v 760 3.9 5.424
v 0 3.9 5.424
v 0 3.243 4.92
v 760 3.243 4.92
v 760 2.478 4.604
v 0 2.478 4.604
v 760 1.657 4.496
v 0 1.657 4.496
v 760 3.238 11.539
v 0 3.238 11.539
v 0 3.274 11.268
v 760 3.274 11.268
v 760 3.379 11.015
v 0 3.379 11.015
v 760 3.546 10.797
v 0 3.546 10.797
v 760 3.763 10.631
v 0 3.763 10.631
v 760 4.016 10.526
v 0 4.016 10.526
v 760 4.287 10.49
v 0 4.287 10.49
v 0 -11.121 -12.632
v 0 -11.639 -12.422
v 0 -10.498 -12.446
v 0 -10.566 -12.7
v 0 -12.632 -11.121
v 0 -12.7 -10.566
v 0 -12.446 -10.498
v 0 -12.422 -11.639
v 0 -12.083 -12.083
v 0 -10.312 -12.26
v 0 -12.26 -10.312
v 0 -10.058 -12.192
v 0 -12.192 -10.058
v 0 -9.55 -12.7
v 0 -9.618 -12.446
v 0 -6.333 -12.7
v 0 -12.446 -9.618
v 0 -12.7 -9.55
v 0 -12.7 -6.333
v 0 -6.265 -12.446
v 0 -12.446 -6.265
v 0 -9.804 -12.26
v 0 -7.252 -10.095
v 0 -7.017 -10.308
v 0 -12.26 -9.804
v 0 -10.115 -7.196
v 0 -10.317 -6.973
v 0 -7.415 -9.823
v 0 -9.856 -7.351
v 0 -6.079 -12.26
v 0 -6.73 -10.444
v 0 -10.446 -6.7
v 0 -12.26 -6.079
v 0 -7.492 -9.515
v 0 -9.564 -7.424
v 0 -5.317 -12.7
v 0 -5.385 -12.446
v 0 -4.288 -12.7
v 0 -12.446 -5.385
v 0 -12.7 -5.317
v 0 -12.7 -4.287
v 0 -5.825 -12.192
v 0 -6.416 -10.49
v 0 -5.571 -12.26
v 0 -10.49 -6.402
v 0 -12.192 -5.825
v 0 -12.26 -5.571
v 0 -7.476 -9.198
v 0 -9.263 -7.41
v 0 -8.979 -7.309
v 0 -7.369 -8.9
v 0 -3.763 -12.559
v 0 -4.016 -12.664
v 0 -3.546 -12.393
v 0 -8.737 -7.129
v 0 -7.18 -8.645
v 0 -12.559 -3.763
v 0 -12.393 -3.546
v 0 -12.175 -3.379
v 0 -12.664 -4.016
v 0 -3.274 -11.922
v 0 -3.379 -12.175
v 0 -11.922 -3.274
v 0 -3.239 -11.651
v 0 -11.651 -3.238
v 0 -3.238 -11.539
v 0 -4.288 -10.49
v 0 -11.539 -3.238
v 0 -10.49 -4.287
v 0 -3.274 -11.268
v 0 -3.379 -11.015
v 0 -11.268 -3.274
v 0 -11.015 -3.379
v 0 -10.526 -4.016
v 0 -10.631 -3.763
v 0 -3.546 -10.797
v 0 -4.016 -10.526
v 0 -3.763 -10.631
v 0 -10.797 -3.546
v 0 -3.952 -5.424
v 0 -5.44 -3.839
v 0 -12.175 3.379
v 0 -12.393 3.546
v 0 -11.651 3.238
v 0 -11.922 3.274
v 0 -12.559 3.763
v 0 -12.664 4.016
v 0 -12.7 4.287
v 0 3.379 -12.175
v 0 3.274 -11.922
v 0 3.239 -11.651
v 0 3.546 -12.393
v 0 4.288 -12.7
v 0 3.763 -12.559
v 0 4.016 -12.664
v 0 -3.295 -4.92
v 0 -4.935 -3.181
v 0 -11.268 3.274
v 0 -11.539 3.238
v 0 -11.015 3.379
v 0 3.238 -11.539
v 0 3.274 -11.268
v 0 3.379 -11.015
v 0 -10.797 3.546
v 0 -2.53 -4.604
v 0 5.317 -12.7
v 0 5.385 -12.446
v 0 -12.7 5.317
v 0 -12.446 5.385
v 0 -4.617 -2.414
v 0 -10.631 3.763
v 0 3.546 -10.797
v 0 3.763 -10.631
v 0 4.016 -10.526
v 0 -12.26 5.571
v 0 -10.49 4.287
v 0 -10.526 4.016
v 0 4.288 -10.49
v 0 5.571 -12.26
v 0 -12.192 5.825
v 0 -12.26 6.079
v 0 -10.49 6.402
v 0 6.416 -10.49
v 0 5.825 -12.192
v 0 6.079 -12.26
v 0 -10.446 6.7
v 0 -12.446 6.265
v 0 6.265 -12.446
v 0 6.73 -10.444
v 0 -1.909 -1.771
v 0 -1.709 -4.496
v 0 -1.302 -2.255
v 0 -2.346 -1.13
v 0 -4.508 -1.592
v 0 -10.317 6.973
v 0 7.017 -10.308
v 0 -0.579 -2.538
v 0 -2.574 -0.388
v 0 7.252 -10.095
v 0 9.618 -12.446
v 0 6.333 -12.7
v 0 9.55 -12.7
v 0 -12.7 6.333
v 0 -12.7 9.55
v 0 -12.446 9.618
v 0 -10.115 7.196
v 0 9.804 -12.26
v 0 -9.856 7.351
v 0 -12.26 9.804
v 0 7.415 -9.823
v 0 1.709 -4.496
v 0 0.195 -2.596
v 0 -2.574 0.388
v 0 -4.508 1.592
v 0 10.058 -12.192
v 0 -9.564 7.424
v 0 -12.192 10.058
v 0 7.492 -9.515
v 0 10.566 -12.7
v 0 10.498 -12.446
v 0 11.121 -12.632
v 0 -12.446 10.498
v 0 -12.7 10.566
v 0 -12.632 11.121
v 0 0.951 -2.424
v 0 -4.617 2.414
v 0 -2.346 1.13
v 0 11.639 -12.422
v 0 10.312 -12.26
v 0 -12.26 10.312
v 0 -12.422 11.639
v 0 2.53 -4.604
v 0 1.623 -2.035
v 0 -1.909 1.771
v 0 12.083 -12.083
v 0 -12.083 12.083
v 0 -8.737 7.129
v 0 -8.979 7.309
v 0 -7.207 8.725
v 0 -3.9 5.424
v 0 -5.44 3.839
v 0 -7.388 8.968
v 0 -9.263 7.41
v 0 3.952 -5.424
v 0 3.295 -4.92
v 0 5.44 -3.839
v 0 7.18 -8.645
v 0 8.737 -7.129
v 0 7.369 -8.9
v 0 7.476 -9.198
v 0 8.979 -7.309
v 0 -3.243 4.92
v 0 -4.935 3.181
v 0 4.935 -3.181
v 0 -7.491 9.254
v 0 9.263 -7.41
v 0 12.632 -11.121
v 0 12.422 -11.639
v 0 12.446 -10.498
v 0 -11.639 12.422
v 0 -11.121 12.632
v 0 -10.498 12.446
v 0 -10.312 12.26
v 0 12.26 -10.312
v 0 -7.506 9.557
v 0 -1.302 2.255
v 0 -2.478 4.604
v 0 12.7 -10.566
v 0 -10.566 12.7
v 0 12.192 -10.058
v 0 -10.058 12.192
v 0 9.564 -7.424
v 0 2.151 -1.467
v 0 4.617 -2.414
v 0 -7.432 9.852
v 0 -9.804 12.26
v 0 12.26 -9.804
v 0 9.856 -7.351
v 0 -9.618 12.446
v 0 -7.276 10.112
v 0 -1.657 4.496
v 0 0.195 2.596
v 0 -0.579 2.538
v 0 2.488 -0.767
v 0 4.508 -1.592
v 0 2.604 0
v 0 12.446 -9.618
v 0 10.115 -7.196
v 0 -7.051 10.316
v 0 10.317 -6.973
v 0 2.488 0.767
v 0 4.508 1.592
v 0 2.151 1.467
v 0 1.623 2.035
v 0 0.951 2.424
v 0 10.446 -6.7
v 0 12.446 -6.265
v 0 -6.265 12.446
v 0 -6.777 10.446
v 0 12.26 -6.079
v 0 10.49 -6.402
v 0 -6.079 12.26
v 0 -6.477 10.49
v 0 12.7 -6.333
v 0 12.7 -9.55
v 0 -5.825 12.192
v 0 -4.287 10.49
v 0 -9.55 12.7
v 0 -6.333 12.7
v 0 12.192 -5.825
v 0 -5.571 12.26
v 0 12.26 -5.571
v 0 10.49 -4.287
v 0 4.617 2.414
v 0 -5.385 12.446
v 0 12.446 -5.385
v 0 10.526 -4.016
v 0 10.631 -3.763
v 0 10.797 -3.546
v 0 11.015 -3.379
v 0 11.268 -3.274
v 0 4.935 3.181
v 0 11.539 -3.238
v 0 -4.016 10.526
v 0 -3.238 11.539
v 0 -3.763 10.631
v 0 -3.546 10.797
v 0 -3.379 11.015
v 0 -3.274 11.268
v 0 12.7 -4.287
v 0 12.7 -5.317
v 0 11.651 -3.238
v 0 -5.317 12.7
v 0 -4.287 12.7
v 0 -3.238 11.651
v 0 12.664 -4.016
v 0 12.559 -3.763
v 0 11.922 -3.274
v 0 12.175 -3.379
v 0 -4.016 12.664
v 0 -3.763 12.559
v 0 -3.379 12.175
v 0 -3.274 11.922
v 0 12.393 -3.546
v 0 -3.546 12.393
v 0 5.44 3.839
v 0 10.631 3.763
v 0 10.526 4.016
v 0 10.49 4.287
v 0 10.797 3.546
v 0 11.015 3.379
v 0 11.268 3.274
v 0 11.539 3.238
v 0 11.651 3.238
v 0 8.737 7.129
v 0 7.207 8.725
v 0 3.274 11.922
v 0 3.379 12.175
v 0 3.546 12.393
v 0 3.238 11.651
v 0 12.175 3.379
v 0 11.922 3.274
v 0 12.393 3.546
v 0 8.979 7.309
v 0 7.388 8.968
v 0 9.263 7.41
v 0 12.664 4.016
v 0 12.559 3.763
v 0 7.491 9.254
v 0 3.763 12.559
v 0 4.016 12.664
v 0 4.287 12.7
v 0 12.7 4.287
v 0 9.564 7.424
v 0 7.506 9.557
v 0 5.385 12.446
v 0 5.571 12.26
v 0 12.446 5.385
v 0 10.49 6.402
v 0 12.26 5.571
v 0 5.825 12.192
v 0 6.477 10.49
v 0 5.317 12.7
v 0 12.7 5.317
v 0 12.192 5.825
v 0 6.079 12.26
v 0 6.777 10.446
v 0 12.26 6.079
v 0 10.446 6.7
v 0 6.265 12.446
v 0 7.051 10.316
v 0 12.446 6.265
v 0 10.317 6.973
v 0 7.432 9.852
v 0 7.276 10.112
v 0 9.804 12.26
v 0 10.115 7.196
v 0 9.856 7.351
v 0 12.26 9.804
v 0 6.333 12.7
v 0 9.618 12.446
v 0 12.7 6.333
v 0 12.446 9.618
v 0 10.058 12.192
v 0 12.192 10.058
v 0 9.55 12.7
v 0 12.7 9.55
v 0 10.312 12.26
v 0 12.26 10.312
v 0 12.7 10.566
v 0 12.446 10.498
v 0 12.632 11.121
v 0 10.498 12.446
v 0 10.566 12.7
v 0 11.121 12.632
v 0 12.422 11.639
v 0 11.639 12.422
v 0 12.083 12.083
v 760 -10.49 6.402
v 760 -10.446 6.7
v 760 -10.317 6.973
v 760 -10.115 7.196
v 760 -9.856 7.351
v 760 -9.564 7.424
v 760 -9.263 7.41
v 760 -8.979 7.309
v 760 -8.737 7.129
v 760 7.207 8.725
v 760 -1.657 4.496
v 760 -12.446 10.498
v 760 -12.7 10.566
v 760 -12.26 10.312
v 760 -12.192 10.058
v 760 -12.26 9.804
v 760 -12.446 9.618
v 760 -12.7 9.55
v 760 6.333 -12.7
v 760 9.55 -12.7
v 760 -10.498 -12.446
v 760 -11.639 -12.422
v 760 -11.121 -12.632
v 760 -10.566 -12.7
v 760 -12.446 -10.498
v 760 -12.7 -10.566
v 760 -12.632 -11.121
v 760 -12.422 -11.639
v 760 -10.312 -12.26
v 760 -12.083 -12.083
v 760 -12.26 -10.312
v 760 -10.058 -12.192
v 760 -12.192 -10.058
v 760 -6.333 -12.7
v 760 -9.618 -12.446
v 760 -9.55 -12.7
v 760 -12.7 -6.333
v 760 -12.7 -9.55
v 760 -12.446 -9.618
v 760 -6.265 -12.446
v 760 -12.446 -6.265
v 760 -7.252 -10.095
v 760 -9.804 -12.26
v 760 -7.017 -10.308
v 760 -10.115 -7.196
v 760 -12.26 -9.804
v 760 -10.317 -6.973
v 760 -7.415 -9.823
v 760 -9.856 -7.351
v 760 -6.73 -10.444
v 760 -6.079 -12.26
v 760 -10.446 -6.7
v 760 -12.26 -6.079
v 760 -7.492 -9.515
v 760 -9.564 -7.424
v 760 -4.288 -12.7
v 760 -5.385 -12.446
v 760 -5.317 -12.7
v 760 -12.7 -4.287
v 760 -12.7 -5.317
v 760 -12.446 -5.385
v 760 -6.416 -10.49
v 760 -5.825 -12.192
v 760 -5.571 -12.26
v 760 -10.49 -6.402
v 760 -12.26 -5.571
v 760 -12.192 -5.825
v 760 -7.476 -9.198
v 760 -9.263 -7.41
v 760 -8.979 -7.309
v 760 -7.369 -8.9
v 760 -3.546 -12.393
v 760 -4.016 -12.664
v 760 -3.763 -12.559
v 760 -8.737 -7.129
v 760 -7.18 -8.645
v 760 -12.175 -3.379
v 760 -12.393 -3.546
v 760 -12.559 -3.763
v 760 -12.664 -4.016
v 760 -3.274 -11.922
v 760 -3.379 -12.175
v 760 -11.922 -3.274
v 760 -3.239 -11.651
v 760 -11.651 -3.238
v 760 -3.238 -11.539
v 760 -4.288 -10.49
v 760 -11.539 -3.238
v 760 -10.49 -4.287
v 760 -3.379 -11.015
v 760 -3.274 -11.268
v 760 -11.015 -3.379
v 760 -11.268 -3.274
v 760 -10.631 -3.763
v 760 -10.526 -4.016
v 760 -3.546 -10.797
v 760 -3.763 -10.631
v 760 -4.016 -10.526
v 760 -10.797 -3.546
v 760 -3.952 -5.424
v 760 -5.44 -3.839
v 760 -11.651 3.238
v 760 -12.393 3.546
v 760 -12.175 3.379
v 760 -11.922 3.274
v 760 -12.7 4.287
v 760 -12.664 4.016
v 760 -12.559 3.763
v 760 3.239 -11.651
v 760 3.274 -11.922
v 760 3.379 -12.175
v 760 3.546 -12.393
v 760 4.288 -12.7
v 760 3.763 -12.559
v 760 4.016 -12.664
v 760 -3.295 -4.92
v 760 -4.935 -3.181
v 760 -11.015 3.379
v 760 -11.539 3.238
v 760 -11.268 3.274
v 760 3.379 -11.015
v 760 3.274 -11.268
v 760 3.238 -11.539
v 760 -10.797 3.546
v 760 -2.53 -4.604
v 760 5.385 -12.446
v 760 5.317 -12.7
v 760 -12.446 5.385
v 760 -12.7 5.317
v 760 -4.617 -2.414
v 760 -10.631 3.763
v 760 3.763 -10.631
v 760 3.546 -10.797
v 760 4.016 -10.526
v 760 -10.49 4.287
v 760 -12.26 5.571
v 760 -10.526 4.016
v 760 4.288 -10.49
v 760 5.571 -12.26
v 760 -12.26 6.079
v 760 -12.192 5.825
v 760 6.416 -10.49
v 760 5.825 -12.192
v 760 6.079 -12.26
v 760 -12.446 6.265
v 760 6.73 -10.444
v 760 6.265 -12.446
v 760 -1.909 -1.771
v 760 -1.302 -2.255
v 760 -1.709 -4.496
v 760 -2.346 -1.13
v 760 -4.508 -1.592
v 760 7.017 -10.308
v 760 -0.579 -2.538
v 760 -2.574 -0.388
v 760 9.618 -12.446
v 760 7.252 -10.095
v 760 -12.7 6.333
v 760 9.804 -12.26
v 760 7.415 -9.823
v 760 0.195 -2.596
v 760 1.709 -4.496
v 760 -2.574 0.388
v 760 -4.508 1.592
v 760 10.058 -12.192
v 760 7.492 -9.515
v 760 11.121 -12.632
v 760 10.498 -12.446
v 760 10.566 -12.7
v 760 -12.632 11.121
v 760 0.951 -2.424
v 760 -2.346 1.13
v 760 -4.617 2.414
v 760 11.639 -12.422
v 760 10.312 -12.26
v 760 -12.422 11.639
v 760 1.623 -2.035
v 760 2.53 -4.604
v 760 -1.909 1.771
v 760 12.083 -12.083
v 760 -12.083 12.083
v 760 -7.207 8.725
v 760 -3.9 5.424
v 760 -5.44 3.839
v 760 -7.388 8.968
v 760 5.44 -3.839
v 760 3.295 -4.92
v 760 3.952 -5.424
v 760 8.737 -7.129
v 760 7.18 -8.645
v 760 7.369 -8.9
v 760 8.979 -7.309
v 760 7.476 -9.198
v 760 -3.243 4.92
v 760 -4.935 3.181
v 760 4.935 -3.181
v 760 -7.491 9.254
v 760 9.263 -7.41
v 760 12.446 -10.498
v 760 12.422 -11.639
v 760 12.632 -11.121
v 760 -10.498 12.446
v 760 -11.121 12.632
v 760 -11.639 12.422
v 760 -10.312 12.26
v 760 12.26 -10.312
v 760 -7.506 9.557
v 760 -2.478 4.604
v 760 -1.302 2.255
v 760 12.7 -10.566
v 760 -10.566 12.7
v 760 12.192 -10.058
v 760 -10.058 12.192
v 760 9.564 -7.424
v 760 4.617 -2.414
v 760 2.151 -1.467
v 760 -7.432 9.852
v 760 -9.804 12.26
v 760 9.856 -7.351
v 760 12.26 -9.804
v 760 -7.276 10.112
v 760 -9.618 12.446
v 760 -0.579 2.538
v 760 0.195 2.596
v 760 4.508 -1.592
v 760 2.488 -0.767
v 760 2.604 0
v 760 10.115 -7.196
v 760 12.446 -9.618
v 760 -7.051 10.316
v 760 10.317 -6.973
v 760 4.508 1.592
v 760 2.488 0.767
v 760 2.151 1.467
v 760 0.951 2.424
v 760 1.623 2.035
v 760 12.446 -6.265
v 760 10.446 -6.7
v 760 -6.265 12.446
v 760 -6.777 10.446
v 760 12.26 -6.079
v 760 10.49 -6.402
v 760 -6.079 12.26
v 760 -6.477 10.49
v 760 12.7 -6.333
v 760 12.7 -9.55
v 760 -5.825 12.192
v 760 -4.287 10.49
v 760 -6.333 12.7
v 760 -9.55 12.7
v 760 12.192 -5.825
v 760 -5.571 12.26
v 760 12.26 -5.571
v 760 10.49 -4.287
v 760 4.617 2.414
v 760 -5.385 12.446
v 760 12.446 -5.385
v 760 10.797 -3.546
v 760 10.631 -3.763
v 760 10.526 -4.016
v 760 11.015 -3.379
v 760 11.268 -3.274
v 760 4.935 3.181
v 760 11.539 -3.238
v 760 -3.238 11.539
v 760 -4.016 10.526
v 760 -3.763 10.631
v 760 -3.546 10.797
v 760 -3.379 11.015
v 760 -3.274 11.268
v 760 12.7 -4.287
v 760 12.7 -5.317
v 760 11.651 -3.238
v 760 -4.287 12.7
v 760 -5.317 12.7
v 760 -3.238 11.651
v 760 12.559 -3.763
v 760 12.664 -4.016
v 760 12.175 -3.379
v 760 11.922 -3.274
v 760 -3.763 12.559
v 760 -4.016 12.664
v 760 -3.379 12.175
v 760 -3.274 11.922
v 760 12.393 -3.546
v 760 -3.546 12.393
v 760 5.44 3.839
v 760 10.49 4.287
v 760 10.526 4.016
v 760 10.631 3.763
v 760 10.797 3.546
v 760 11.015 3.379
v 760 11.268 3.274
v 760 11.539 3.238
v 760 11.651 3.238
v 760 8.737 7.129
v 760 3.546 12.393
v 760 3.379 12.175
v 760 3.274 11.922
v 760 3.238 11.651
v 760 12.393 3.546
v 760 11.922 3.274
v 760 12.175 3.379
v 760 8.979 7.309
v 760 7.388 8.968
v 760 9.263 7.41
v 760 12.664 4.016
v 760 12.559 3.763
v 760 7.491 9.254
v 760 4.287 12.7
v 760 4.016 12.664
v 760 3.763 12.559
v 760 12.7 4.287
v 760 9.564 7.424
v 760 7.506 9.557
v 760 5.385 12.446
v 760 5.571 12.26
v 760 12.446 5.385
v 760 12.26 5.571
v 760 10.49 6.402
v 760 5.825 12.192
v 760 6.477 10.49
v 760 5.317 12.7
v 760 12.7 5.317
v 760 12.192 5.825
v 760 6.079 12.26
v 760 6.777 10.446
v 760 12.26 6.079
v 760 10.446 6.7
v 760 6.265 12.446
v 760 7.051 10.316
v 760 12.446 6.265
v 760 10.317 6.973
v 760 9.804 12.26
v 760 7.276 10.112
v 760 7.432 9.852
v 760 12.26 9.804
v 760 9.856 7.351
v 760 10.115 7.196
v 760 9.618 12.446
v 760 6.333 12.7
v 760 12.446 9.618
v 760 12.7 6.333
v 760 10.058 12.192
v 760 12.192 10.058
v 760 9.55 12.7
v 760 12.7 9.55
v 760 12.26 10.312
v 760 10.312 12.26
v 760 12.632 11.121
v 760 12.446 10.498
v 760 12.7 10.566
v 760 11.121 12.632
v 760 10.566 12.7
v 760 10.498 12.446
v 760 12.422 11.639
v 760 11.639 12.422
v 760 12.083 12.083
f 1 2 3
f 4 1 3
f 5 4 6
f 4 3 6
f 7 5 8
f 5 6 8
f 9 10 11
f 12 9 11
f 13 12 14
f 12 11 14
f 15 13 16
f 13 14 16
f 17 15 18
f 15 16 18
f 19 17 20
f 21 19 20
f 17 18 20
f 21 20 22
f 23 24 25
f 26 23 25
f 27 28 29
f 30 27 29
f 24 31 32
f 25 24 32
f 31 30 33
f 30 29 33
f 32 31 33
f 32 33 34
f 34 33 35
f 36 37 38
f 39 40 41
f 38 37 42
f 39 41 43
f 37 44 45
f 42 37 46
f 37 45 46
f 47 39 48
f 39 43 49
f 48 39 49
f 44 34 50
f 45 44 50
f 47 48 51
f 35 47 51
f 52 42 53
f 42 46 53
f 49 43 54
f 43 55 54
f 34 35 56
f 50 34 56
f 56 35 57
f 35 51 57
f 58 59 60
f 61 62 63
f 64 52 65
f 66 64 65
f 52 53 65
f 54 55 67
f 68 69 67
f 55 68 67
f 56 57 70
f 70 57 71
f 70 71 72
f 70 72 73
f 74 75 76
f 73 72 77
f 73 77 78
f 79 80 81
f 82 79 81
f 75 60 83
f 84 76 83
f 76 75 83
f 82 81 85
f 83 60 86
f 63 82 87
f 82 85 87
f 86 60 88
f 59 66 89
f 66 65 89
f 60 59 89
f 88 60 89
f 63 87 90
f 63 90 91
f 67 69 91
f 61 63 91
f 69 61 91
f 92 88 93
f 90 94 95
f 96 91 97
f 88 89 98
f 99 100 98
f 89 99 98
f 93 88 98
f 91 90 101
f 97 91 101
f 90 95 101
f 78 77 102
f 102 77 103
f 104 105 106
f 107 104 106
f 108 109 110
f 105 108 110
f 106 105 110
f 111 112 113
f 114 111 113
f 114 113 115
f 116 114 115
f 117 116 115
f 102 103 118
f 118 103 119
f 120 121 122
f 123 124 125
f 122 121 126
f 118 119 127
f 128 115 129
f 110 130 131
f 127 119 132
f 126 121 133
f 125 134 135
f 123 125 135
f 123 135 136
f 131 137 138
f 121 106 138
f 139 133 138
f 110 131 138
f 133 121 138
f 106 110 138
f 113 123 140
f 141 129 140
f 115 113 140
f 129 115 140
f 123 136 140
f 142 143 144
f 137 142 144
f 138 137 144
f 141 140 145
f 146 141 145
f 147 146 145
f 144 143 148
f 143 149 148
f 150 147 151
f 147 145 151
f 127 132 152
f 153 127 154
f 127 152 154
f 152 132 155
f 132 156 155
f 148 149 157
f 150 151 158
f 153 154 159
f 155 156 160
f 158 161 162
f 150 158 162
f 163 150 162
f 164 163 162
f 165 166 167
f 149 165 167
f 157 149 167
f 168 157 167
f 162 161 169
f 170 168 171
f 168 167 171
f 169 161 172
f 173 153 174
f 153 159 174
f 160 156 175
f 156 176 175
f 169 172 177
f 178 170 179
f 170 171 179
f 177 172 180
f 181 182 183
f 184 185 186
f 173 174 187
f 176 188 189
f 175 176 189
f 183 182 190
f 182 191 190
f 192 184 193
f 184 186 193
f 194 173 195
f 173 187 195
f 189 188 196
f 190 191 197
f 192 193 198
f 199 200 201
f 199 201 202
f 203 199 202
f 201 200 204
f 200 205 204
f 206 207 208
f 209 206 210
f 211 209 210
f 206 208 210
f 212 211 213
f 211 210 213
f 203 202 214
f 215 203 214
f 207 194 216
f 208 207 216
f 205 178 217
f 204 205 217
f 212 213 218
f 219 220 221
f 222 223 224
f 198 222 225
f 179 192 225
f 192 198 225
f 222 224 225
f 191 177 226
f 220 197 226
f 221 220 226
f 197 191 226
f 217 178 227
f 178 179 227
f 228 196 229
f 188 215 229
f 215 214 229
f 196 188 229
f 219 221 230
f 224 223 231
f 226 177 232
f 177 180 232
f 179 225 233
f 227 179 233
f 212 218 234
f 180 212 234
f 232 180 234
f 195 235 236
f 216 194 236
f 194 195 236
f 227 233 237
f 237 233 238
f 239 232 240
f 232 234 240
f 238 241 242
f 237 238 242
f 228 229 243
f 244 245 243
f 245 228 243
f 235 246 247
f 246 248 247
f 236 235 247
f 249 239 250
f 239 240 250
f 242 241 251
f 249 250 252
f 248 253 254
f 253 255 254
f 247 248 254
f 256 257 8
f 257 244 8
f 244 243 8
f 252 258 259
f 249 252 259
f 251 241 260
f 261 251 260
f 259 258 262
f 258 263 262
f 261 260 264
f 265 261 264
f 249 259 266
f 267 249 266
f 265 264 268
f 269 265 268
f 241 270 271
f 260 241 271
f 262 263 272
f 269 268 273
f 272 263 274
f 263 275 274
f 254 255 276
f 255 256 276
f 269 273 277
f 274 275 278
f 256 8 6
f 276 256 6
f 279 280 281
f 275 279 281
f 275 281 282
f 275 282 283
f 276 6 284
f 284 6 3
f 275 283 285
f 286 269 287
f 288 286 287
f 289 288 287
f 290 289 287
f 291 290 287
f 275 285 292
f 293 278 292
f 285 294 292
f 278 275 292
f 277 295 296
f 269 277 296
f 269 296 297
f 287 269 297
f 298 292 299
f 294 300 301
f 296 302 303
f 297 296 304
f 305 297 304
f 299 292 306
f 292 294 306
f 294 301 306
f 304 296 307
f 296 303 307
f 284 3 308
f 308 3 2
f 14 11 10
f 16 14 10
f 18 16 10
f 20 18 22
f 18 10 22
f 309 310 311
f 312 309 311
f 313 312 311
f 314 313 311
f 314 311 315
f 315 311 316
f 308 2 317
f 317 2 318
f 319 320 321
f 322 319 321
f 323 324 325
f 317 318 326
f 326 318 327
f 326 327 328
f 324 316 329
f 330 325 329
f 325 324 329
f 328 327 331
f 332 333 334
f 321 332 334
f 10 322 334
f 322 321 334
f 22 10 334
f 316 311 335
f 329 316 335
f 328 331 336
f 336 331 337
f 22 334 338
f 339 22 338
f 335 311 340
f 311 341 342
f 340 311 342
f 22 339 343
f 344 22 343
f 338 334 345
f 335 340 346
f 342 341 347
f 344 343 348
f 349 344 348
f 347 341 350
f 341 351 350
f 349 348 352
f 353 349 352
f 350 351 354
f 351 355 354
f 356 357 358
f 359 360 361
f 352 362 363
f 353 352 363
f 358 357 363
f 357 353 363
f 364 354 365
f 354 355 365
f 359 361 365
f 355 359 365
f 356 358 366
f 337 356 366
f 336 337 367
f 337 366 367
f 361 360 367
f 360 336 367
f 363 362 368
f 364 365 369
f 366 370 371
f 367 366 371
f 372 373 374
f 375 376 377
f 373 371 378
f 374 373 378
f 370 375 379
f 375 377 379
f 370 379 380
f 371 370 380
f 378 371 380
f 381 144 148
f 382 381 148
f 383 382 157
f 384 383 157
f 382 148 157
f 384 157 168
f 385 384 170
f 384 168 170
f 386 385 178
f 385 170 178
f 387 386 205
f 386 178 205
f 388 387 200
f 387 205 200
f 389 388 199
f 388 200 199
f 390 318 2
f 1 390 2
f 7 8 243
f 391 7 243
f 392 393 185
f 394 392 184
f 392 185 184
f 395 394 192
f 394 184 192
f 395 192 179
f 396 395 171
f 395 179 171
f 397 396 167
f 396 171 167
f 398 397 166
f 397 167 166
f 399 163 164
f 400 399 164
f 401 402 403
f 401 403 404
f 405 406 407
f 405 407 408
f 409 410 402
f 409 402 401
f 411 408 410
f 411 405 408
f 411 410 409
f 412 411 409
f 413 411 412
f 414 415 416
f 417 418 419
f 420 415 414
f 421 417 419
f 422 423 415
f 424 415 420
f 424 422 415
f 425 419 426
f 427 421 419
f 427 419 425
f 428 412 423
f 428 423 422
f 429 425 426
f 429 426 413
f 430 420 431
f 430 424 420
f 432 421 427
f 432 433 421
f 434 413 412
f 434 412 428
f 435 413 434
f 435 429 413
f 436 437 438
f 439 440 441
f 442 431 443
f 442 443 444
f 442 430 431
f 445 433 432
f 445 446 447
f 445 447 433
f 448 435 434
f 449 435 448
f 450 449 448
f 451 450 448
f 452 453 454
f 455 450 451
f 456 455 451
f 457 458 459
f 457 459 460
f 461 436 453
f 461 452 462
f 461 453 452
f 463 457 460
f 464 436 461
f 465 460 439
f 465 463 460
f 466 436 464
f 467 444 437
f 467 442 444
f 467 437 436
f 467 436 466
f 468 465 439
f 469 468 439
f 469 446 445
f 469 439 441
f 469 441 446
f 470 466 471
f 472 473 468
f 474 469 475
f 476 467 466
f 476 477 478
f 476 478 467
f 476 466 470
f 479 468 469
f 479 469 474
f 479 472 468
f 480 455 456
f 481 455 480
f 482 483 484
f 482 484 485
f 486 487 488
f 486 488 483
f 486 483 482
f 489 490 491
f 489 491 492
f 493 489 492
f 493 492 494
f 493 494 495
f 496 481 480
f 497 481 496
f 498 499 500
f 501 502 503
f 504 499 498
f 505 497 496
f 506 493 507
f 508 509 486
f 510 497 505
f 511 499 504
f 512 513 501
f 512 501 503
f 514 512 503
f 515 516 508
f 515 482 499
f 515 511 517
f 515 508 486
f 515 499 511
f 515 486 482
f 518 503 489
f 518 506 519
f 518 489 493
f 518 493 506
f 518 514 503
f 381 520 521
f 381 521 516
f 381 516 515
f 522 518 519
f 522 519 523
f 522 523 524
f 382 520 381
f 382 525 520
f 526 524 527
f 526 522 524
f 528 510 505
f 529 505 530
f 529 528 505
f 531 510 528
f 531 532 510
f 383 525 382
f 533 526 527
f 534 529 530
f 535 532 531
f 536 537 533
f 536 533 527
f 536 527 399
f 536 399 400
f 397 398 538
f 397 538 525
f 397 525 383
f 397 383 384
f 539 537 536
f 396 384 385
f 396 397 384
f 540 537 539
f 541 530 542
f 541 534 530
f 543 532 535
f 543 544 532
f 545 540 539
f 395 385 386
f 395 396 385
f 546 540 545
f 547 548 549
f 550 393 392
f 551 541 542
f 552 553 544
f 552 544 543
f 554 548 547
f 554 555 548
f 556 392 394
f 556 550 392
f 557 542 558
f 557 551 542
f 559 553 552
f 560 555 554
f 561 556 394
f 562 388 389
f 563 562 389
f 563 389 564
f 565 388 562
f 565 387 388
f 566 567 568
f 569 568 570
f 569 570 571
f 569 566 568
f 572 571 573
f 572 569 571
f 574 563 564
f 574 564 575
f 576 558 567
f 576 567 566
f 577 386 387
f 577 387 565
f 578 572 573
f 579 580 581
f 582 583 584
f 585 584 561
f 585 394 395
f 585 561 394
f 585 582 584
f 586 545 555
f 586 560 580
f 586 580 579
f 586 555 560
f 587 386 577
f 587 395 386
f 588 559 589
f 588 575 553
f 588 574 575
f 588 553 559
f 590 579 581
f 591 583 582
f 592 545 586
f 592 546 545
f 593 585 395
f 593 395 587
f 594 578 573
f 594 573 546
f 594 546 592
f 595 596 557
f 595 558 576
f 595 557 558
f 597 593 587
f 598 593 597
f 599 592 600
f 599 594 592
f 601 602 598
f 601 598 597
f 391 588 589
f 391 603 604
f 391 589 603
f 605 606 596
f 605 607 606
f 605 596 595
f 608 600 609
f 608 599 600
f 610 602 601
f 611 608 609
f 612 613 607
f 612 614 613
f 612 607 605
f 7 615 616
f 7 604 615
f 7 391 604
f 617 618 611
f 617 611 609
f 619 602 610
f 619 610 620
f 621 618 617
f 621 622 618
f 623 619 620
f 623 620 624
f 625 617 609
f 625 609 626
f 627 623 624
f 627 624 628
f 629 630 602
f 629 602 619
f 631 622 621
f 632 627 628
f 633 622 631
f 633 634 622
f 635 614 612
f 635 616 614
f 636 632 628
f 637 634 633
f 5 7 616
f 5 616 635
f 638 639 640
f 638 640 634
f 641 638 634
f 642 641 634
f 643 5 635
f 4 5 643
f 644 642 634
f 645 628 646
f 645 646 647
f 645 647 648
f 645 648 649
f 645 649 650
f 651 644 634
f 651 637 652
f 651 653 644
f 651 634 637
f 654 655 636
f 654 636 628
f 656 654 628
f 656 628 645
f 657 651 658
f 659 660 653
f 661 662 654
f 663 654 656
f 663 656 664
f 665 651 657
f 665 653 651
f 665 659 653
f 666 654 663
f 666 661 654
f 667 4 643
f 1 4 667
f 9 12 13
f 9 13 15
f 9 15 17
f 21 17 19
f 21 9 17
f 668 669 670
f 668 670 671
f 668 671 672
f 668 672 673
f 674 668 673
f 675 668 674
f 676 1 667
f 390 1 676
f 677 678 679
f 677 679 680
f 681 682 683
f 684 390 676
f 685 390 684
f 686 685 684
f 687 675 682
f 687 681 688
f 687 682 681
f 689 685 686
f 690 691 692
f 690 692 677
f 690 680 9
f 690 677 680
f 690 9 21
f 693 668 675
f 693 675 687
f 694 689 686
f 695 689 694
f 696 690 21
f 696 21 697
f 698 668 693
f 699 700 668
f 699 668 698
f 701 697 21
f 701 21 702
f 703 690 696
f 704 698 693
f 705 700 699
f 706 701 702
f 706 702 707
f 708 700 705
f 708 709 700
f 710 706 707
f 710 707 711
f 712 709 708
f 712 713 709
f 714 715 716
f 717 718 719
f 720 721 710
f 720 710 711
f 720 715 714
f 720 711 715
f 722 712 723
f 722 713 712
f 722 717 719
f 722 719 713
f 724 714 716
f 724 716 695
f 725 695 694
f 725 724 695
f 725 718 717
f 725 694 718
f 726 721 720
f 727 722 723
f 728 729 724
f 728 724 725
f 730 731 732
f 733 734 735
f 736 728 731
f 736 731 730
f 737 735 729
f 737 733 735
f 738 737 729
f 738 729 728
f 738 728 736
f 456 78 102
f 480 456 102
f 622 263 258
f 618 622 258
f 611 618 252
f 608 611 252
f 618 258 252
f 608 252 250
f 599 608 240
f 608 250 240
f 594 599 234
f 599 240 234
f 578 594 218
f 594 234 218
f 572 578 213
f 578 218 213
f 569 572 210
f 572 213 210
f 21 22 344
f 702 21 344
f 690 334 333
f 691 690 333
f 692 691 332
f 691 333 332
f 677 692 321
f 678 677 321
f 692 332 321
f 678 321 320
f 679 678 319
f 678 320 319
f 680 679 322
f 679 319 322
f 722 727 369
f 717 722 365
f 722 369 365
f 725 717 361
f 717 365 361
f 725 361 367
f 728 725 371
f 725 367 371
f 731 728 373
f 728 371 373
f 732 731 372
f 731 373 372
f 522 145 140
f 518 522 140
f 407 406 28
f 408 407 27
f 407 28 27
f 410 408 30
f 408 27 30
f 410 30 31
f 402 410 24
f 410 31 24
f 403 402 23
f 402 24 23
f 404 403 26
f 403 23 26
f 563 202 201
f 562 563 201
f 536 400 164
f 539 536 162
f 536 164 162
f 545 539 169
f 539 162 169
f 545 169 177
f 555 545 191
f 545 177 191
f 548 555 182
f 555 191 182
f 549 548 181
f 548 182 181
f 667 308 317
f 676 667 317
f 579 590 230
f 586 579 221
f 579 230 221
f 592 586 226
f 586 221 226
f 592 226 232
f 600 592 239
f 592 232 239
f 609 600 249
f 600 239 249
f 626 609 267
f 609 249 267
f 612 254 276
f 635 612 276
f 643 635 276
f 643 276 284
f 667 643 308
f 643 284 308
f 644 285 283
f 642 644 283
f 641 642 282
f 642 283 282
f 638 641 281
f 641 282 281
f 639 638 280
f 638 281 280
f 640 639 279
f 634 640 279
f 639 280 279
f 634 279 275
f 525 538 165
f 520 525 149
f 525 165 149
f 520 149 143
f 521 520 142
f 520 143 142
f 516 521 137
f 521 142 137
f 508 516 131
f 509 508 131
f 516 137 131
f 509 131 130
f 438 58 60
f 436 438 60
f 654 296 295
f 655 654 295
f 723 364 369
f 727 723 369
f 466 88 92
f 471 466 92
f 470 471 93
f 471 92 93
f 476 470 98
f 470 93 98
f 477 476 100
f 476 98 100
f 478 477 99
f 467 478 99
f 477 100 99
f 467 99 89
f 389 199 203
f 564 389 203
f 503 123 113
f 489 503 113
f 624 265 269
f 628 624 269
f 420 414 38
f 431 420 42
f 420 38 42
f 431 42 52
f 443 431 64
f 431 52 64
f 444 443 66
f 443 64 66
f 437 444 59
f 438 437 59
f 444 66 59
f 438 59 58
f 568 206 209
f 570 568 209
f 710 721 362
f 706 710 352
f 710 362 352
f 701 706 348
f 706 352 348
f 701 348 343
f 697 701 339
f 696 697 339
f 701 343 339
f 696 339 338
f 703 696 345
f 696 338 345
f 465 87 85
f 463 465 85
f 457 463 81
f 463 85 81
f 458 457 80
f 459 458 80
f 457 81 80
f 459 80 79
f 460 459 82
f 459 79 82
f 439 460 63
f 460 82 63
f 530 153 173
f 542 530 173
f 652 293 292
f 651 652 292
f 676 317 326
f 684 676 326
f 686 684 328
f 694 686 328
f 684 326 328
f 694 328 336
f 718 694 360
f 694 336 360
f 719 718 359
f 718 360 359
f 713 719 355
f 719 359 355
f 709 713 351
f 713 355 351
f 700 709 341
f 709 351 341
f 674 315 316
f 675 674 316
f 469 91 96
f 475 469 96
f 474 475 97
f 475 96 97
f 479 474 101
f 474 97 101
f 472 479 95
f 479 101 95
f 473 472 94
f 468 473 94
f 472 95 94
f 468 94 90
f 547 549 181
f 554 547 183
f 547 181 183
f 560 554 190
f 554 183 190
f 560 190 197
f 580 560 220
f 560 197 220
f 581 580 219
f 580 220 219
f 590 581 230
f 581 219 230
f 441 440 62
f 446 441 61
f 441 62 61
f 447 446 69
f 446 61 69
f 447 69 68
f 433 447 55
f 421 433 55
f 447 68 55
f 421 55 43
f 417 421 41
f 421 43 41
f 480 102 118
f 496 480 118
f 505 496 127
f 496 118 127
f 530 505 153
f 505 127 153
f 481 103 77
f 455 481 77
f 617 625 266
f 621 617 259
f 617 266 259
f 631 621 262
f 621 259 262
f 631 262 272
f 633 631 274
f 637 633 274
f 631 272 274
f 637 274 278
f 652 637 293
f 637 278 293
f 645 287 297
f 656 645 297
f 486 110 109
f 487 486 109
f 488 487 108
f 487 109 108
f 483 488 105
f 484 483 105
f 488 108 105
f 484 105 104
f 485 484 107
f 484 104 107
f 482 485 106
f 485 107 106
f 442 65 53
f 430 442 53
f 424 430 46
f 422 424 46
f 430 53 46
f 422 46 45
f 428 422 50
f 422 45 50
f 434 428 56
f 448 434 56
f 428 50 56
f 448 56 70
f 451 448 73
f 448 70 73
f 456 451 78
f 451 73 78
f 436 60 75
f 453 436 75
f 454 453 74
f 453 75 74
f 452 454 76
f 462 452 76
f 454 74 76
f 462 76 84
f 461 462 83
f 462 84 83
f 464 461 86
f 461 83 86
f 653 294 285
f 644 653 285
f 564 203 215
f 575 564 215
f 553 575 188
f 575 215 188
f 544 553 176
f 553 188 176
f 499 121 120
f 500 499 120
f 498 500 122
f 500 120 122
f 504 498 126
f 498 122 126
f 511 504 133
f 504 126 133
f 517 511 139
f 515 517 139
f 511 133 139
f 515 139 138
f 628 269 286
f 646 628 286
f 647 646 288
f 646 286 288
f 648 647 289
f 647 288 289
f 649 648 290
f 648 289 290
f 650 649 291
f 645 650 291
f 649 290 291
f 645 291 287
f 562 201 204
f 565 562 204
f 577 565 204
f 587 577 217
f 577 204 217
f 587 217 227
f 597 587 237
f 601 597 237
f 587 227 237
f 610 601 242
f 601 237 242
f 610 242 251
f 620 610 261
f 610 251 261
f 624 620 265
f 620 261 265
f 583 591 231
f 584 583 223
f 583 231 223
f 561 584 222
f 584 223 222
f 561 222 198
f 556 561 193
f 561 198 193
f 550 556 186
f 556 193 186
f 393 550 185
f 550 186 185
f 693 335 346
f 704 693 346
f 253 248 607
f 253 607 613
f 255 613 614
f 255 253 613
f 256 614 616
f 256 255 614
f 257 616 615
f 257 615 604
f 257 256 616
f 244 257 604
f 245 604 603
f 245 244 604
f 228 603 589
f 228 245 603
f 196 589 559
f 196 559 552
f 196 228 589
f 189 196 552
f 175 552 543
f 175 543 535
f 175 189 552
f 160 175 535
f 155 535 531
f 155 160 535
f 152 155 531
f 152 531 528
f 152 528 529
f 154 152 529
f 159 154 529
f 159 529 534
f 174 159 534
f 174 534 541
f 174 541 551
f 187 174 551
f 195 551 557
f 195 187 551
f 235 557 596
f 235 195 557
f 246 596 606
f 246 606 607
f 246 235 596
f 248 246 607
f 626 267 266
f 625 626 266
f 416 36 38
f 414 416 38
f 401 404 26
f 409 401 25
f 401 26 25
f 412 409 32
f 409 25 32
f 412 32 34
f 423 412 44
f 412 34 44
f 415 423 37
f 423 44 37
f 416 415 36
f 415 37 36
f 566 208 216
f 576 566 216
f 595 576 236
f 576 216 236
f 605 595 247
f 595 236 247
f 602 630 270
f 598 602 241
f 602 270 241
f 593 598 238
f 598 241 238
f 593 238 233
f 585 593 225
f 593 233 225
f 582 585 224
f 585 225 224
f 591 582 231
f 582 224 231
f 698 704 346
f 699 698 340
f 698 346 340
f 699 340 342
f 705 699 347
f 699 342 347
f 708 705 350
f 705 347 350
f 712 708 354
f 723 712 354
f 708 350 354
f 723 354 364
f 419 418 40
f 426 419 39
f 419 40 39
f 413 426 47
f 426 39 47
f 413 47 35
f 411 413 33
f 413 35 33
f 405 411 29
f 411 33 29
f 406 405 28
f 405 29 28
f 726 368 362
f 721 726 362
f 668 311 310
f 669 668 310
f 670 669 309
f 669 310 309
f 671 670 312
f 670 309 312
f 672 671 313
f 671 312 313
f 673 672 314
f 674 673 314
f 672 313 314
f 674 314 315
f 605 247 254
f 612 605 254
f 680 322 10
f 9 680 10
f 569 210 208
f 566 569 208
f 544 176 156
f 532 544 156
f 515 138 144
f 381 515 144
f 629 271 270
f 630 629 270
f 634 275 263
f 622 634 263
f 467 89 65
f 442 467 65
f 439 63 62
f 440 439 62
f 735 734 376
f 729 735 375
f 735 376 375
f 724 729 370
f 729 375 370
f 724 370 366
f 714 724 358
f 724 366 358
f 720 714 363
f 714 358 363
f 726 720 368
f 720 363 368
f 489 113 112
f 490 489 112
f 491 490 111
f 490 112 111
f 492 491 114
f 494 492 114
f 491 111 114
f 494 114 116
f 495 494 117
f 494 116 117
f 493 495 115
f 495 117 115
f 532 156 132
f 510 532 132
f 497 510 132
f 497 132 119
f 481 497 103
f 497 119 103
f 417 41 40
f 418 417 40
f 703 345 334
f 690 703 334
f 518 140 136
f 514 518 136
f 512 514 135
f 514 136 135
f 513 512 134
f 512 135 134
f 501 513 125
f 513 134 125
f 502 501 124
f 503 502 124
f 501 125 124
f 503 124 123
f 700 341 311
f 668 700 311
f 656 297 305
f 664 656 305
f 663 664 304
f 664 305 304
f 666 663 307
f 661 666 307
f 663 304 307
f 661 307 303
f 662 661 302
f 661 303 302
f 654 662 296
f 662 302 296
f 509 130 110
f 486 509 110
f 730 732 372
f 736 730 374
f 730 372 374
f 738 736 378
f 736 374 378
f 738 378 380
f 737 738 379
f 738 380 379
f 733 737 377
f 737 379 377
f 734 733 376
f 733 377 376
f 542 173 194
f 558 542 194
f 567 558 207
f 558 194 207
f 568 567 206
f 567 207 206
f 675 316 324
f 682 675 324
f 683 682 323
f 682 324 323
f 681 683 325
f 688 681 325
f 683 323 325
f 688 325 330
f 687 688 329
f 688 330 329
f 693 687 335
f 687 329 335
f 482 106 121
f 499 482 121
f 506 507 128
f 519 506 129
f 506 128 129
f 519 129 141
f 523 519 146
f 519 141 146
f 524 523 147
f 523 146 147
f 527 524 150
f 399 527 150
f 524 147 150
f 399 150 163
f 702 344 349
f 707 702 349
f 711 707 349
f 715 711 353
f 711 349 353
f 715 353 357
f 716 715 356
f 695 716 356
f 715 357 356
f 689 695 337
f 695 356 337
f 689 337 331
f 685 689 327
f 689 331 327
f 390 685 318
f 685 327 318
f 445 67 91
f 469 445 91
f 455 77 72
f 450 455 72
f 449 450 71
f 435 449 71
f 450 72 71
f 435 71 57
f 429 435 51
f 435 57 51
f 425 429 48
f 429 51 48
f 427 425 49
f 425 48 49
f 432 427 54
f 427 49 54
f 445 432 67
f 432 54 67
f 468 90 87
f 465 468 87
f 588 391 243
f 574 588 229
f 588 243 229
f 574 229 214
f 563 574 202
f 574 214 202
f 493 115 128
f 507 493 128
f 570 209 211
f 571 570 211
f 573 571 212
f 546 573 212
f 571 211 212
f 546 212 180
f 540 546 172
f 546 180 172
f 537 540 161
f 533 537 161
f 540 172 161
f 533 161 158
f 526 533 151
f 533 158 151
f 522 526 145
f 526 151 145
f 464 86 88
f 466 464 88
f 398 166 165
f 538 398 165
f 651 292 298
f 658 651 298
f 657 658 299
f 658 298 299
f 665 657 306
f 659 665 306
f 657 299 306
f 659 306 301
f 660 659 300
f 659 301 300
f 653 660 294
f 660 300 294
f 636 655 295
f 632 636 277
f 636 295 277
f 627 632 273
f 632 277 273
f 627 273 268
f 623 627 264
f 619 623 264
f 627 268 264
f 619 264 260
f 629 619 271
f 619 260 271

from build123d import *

# Parameters (mm, degrees)
SKETCH11_R                     = 2.6035
EXTRUSION_1010_PROFILE_1_DEPTH = 760


with BuildPart() as part:
    # Sketch11 → Extrusion 1010 PROFILE(1) (new body)
    with BuildSketch(Plane.YZ):
        with BuildLine():
            Line((-1.709253557, -4.4958), (1.709253557, -4.4958))
            ThreePointArc((1.709253557, -4.4958), (2.922935876, -4.736928798), (3.95226937, -5.423689619))
            Line((3.95226937, -5.423689619), (7.179652728, -8.645192207))
            ThreePointArc((7.179652728, -8.645192207), (7.414733441, -9.822812921), (6.41641086, -10.4902))
            Line((6.41641086, -10.4902), (4.28752, -10.4902))
            ThreePointArc((4.28752, -10.4902), (3.545750844, -10.797450844), (3.2385, -11.53922))
            Line((3.2385, -11.53922), (3.2385, -11.65098))
            ThreePointArc((3.2385, -11.65098), (3.545750844, -12.392749156), (4.28752, -12.7))
            Line((4.28752, -12.7), (5.3171344, -12.7))
            ThreePointArc((5.3171344, -12.7), (5.8251344, -12.192), (6.3331344, -12.7))
            Line((6.3331344, -12.7), (9.5504, -12.7))
            ThreePointArc((9.5504, -12.7), (10.058323491, -12.192000006), (10.566399977, -12.699846982))
            ThreePointArc((10.566399977, -12.699846982), (12.082522516, -12.082522516), (12.699846982, -10.566399977))
            ThreePointArc((12.699846982, -10.566399977), (12.192000006, -10.058323491), (12.7, -9.5504))
            Line((12.7, -9.5504), (12.7, -6.3330836))
            ThreePointArc((12.7, -6.3330836), (12.192, -5.8250836), (12.7, -5.3170836))
            Line((12.7, -5.3170836), (12.7, -4.287470133))
            ThreePointArc((12.7, -4.287470133), (12.392749156, -3.545700977), (11.65098, -3.238450133))
            Line((11.65098, -3.238450133), (11.53922, -3.238450133))
            ThreePointArc((11.53922, -3.238450133), (10.797450844, -3.545700977), (10.4902, -4.287470133))
            Line((10.4902, -4.287470133), (10.4902, -6.402089023))
            ThreePointArc((10.4902, -6.402089023), (9.856394933, -7.351113629), (8.736962546, -7.129240479))
            Line((8.736962546, -7.129240479), (5.440484187, -3.838768792))
            ThreePointArc((5.440484187, -3.838768792), (4.75073678, -2.808015636), (4.5085, -1.591658411))
            Line((4.5085, -1.591658411), (4.5085, 1.591658411))
            ThreePointArc((4.5085, 1.591658411), (4.75073678, 2.808015636), (5.440484187, 3.838768792))
            Line((5.440484187, 3.838768792), (8.736962546, 7.129240479))
            ThreePointArc((8.736962546, 7.129240479), (9.856394933, 7.351113629), (10.4902, 6.402089023))
            Line((10.4902, 6.402089023), (10.4902, 4.287470133))
            ThreePointArc((10.4902, 4.287470133), (10.797450844, 3.545700977), (11.53922, 3.238450133))
            Line((11.53922, 3.238450133), (11.65098, 3.238450133))
            ThreePointArc((11.65098, 3.238450133), (12.392749156, 3.545700977), (12.7, 4.287470133))
            Line((12.7, 4.287470133), (12.7, 5.3171344))
            ThreePointArc((12.7, 5.3171344), (12.192, 5.8251344), (12.7, 6.3331344))
            Line((12.7, 6.3331344), (12.7, 9.5504))
            ThreePointArc((12.7, 9.5504), (12.192000006, 10.058323491), (12.699846982, 10.566399977))
            ThreePointArc((12.699846982, 10.566399977), (12.082522516, 12.082522516), (10.566399977, 12.699846982))
            ThreePointArc((10.566399977, 12.699846982), (10.058323491, 12.192000006), (9.5504, 12.7))
            Line((9.5504, 12.7), (6.3330836, 12.7))
            ThreePointArc((6.3330836, 12.7), (5.8250836, 12.192), (5.3170836, 12.7))
            Line((5.3170836, 12.7), (4.2874692, 12.7))
            ThreePointArc((4.2874692, 12.7), (3.545700044, 12.392749156), (3.2384492, 11.65098))
            Line((3.2384492, 11.65098), (3.2384492, 11.53922))
            ThreePointArc((3.2384492, 11.53922), (3.545700044, 10.797450844), (4.2874692, 10.4902))
            Line((4.2874692, 10.4902), (6.476774195, 10.4902))
            ThreePointArc((6.476774195, 10.4902), (7.43216212, 9.851515102), (7.207191475, 8.724540082))
            Line((7.207191475, 8.724540082), (3.900315394, 5.423689619))
            ThreePointArc((3.900315394, 5.423689619), (2.8709819, 4.736928798), (1.657299581, 4.4958))
            Line((1.657299581, 4.4958), (-1.657299581, 4.4958))
            ThreePointArc((-1.657299581, 4.4958), (-2.8709819, 4.736928798), (-3.900315394, 5.423689619))
            Line((-3.900315394, 5.423689619), (-7.207191475, 8.724540082))
            ThreePointArc((-7.207191475, 8.724540082), (-7.43216212, 9.851515102), (-6.476774195, 10.4902))
            Line((-6.476774195, 10.4902), (-4.2874692, 10.4902))
            ThreePointArc((-4.2874692, 10.4902), (-3.545700044, 10.797450844), (-3.2384492, 11.53922))
            Line((-3.2384492, 11.53922), (-3.2384492, 11.65098))
            ThreePointArc((-3.2384492, 11.65098), (-3.545700044, 12.392749156), (-4.2874692, 12.7))
            Line((-4.2874692, 12.7), (-5.3170836, 12.7))
            ThreePointArc((-5.3170836, 12.7), (-5.8250836, 12.192), (-6.3330836, 12.7))
            Line((-6.3330836, 12.7), (-9.5504, 12.7))
            ThreePointArc((-9.5504, 12.7), (-10.058323491, 12.192000006), (-10.566399977, 12.699846982))
            ThreePointArc((-10.566399977, 12.699846982), (-12.082522516, 12.082522516), (-12.699846982, 10.566399977))
            ThreePointArc((-12.699846982, 10.566399977), (-12.192000006, 10.058323491), (-12.7, 9.5504))
            Line((-12.7, 9.5504), (-12.7, 6.3331344))
            ThreePointArc((-12.7, 6.3331344), (-12.192, 5.8251344), (-12.7, 5.3171344))
            Line((-12.7, 5.3171344), (-12.7, 4.287470133))
            ThreePointArc((-12.7, 4.287470133), (-12.392749156, 3.545700977), (-11.65098, 3.238450133))
            Line((-11.65098, 3.238450133), (-11.53922, 3.238450133))
            ThreePointArc((-11.53922, 3.238450133), (-10.797450844, 3.545700977), (-10.4902, 4.287470133))
            Line((-10.4902, 4.287470133), (-10.4902, 6.402089023))
            ThreePointArc((-10.4902, 6.402089023), (-9.856394933, 7.351113629), (-8.736962546, 7.129240479))
            Line((-8.736962546, 7.129240479), (-5.440484187, 3.838768792))
            ThreePointArc((-5.440484187, 3.838768792), (-4.75073678, 2.808015636), (-4.5085, 1.591658411))
            Line((-4.5085, 1.591658411), (-4.5085, -1.591658411))
            ThreePointArc((-4.5085, -1.591658411), (-4.75073678, -2.808015636), (-5.440484187, -3.838768792))
            Line((-5.440484187, -3.838768792), (-8.736962546, -7.129240479))
            ThreePointArc((-8.736962546, -7.129240479), (-9.856394933, -7.351113629), (-10.4902, -6.402089023))
            Line((-10.4902, -6.402089023), (-10.4902, -4.287470133))
            ThreePointArc((-10.4902, -4.287470133), (-10.797450844, -3.545700977), (-11.53922, -3.238450133))
            Line((-11.53922, -3.238450133), (-11.65098, -3.238450133))
            ThreePointArc((-11.65098, -3.238450133), (-12.392749156, -3.545700977), (-12.7, -4.287470133))
            Line((-12.7, -4.287470133), (-12.7, -5.3170836))
            ThreePointArc((-12.7, -5.3170836), (-12.192, -5.8250836), (-12.7, -6.3330836))
            Line((-12.7, -6.3330836), (-12.7, -9.5504))
            ThreePointArc((-12.7, -9.5504), (-12.192000006, -10.058323491), (-12.699846982, -10.566399977))
            ThreePointArc((-12.699846982, -10.566399977), (-12.082522516, -12.082522516), (-10.566399977, -12.699846982))
            ThreePointArc((-10.566399977, -12.699846982), (-10.058323491, -12.192000006), (-9.5504, -12.7))
            Line((-9.5504, -12.7), (-6.3331344, -12.7))
            ThreePointArc((-6.3331344, -12.7), (-5.8251344, -12.192), (-5.3171344, -12.7))
            Line((-5.3171344, -12.7), (-4.28752, -12.7))
            ThreePointArc((-4.28752, -12.7), (-3.545750844, -12.392749156), (-3.2385, -11.65098))
            Line((-3.2385, -11.65098), (-3.2385, -11.53922))
            ThreePointArc((-3.2385, -11.53922), (-3.545750844, -10.797450844), (-4.28752, -10.4902))
            Line((-4.28752, -10.4902), (-6.41641086, -10.4902))
            ThreePointArc((-6.41641086, -10.4902), (-7.414733441, -9.822812921), (-7.179652728, -8.645192207))
            Line((-7.179652728, -8.645192207), (-3.95226937, -5.423689619))
            ThreePointArc((-3.95226937, -5.423689619), (-2.922935876, -4.736928798), (-1.709253557, -4.4958))
        make_face()
        Circle(SKETCH11_R, mode=Mode.SUBTRACT)
    extrude(amount=EXTRUSION_1010_PROFILE_1_DEPTH)


solid = part.part
